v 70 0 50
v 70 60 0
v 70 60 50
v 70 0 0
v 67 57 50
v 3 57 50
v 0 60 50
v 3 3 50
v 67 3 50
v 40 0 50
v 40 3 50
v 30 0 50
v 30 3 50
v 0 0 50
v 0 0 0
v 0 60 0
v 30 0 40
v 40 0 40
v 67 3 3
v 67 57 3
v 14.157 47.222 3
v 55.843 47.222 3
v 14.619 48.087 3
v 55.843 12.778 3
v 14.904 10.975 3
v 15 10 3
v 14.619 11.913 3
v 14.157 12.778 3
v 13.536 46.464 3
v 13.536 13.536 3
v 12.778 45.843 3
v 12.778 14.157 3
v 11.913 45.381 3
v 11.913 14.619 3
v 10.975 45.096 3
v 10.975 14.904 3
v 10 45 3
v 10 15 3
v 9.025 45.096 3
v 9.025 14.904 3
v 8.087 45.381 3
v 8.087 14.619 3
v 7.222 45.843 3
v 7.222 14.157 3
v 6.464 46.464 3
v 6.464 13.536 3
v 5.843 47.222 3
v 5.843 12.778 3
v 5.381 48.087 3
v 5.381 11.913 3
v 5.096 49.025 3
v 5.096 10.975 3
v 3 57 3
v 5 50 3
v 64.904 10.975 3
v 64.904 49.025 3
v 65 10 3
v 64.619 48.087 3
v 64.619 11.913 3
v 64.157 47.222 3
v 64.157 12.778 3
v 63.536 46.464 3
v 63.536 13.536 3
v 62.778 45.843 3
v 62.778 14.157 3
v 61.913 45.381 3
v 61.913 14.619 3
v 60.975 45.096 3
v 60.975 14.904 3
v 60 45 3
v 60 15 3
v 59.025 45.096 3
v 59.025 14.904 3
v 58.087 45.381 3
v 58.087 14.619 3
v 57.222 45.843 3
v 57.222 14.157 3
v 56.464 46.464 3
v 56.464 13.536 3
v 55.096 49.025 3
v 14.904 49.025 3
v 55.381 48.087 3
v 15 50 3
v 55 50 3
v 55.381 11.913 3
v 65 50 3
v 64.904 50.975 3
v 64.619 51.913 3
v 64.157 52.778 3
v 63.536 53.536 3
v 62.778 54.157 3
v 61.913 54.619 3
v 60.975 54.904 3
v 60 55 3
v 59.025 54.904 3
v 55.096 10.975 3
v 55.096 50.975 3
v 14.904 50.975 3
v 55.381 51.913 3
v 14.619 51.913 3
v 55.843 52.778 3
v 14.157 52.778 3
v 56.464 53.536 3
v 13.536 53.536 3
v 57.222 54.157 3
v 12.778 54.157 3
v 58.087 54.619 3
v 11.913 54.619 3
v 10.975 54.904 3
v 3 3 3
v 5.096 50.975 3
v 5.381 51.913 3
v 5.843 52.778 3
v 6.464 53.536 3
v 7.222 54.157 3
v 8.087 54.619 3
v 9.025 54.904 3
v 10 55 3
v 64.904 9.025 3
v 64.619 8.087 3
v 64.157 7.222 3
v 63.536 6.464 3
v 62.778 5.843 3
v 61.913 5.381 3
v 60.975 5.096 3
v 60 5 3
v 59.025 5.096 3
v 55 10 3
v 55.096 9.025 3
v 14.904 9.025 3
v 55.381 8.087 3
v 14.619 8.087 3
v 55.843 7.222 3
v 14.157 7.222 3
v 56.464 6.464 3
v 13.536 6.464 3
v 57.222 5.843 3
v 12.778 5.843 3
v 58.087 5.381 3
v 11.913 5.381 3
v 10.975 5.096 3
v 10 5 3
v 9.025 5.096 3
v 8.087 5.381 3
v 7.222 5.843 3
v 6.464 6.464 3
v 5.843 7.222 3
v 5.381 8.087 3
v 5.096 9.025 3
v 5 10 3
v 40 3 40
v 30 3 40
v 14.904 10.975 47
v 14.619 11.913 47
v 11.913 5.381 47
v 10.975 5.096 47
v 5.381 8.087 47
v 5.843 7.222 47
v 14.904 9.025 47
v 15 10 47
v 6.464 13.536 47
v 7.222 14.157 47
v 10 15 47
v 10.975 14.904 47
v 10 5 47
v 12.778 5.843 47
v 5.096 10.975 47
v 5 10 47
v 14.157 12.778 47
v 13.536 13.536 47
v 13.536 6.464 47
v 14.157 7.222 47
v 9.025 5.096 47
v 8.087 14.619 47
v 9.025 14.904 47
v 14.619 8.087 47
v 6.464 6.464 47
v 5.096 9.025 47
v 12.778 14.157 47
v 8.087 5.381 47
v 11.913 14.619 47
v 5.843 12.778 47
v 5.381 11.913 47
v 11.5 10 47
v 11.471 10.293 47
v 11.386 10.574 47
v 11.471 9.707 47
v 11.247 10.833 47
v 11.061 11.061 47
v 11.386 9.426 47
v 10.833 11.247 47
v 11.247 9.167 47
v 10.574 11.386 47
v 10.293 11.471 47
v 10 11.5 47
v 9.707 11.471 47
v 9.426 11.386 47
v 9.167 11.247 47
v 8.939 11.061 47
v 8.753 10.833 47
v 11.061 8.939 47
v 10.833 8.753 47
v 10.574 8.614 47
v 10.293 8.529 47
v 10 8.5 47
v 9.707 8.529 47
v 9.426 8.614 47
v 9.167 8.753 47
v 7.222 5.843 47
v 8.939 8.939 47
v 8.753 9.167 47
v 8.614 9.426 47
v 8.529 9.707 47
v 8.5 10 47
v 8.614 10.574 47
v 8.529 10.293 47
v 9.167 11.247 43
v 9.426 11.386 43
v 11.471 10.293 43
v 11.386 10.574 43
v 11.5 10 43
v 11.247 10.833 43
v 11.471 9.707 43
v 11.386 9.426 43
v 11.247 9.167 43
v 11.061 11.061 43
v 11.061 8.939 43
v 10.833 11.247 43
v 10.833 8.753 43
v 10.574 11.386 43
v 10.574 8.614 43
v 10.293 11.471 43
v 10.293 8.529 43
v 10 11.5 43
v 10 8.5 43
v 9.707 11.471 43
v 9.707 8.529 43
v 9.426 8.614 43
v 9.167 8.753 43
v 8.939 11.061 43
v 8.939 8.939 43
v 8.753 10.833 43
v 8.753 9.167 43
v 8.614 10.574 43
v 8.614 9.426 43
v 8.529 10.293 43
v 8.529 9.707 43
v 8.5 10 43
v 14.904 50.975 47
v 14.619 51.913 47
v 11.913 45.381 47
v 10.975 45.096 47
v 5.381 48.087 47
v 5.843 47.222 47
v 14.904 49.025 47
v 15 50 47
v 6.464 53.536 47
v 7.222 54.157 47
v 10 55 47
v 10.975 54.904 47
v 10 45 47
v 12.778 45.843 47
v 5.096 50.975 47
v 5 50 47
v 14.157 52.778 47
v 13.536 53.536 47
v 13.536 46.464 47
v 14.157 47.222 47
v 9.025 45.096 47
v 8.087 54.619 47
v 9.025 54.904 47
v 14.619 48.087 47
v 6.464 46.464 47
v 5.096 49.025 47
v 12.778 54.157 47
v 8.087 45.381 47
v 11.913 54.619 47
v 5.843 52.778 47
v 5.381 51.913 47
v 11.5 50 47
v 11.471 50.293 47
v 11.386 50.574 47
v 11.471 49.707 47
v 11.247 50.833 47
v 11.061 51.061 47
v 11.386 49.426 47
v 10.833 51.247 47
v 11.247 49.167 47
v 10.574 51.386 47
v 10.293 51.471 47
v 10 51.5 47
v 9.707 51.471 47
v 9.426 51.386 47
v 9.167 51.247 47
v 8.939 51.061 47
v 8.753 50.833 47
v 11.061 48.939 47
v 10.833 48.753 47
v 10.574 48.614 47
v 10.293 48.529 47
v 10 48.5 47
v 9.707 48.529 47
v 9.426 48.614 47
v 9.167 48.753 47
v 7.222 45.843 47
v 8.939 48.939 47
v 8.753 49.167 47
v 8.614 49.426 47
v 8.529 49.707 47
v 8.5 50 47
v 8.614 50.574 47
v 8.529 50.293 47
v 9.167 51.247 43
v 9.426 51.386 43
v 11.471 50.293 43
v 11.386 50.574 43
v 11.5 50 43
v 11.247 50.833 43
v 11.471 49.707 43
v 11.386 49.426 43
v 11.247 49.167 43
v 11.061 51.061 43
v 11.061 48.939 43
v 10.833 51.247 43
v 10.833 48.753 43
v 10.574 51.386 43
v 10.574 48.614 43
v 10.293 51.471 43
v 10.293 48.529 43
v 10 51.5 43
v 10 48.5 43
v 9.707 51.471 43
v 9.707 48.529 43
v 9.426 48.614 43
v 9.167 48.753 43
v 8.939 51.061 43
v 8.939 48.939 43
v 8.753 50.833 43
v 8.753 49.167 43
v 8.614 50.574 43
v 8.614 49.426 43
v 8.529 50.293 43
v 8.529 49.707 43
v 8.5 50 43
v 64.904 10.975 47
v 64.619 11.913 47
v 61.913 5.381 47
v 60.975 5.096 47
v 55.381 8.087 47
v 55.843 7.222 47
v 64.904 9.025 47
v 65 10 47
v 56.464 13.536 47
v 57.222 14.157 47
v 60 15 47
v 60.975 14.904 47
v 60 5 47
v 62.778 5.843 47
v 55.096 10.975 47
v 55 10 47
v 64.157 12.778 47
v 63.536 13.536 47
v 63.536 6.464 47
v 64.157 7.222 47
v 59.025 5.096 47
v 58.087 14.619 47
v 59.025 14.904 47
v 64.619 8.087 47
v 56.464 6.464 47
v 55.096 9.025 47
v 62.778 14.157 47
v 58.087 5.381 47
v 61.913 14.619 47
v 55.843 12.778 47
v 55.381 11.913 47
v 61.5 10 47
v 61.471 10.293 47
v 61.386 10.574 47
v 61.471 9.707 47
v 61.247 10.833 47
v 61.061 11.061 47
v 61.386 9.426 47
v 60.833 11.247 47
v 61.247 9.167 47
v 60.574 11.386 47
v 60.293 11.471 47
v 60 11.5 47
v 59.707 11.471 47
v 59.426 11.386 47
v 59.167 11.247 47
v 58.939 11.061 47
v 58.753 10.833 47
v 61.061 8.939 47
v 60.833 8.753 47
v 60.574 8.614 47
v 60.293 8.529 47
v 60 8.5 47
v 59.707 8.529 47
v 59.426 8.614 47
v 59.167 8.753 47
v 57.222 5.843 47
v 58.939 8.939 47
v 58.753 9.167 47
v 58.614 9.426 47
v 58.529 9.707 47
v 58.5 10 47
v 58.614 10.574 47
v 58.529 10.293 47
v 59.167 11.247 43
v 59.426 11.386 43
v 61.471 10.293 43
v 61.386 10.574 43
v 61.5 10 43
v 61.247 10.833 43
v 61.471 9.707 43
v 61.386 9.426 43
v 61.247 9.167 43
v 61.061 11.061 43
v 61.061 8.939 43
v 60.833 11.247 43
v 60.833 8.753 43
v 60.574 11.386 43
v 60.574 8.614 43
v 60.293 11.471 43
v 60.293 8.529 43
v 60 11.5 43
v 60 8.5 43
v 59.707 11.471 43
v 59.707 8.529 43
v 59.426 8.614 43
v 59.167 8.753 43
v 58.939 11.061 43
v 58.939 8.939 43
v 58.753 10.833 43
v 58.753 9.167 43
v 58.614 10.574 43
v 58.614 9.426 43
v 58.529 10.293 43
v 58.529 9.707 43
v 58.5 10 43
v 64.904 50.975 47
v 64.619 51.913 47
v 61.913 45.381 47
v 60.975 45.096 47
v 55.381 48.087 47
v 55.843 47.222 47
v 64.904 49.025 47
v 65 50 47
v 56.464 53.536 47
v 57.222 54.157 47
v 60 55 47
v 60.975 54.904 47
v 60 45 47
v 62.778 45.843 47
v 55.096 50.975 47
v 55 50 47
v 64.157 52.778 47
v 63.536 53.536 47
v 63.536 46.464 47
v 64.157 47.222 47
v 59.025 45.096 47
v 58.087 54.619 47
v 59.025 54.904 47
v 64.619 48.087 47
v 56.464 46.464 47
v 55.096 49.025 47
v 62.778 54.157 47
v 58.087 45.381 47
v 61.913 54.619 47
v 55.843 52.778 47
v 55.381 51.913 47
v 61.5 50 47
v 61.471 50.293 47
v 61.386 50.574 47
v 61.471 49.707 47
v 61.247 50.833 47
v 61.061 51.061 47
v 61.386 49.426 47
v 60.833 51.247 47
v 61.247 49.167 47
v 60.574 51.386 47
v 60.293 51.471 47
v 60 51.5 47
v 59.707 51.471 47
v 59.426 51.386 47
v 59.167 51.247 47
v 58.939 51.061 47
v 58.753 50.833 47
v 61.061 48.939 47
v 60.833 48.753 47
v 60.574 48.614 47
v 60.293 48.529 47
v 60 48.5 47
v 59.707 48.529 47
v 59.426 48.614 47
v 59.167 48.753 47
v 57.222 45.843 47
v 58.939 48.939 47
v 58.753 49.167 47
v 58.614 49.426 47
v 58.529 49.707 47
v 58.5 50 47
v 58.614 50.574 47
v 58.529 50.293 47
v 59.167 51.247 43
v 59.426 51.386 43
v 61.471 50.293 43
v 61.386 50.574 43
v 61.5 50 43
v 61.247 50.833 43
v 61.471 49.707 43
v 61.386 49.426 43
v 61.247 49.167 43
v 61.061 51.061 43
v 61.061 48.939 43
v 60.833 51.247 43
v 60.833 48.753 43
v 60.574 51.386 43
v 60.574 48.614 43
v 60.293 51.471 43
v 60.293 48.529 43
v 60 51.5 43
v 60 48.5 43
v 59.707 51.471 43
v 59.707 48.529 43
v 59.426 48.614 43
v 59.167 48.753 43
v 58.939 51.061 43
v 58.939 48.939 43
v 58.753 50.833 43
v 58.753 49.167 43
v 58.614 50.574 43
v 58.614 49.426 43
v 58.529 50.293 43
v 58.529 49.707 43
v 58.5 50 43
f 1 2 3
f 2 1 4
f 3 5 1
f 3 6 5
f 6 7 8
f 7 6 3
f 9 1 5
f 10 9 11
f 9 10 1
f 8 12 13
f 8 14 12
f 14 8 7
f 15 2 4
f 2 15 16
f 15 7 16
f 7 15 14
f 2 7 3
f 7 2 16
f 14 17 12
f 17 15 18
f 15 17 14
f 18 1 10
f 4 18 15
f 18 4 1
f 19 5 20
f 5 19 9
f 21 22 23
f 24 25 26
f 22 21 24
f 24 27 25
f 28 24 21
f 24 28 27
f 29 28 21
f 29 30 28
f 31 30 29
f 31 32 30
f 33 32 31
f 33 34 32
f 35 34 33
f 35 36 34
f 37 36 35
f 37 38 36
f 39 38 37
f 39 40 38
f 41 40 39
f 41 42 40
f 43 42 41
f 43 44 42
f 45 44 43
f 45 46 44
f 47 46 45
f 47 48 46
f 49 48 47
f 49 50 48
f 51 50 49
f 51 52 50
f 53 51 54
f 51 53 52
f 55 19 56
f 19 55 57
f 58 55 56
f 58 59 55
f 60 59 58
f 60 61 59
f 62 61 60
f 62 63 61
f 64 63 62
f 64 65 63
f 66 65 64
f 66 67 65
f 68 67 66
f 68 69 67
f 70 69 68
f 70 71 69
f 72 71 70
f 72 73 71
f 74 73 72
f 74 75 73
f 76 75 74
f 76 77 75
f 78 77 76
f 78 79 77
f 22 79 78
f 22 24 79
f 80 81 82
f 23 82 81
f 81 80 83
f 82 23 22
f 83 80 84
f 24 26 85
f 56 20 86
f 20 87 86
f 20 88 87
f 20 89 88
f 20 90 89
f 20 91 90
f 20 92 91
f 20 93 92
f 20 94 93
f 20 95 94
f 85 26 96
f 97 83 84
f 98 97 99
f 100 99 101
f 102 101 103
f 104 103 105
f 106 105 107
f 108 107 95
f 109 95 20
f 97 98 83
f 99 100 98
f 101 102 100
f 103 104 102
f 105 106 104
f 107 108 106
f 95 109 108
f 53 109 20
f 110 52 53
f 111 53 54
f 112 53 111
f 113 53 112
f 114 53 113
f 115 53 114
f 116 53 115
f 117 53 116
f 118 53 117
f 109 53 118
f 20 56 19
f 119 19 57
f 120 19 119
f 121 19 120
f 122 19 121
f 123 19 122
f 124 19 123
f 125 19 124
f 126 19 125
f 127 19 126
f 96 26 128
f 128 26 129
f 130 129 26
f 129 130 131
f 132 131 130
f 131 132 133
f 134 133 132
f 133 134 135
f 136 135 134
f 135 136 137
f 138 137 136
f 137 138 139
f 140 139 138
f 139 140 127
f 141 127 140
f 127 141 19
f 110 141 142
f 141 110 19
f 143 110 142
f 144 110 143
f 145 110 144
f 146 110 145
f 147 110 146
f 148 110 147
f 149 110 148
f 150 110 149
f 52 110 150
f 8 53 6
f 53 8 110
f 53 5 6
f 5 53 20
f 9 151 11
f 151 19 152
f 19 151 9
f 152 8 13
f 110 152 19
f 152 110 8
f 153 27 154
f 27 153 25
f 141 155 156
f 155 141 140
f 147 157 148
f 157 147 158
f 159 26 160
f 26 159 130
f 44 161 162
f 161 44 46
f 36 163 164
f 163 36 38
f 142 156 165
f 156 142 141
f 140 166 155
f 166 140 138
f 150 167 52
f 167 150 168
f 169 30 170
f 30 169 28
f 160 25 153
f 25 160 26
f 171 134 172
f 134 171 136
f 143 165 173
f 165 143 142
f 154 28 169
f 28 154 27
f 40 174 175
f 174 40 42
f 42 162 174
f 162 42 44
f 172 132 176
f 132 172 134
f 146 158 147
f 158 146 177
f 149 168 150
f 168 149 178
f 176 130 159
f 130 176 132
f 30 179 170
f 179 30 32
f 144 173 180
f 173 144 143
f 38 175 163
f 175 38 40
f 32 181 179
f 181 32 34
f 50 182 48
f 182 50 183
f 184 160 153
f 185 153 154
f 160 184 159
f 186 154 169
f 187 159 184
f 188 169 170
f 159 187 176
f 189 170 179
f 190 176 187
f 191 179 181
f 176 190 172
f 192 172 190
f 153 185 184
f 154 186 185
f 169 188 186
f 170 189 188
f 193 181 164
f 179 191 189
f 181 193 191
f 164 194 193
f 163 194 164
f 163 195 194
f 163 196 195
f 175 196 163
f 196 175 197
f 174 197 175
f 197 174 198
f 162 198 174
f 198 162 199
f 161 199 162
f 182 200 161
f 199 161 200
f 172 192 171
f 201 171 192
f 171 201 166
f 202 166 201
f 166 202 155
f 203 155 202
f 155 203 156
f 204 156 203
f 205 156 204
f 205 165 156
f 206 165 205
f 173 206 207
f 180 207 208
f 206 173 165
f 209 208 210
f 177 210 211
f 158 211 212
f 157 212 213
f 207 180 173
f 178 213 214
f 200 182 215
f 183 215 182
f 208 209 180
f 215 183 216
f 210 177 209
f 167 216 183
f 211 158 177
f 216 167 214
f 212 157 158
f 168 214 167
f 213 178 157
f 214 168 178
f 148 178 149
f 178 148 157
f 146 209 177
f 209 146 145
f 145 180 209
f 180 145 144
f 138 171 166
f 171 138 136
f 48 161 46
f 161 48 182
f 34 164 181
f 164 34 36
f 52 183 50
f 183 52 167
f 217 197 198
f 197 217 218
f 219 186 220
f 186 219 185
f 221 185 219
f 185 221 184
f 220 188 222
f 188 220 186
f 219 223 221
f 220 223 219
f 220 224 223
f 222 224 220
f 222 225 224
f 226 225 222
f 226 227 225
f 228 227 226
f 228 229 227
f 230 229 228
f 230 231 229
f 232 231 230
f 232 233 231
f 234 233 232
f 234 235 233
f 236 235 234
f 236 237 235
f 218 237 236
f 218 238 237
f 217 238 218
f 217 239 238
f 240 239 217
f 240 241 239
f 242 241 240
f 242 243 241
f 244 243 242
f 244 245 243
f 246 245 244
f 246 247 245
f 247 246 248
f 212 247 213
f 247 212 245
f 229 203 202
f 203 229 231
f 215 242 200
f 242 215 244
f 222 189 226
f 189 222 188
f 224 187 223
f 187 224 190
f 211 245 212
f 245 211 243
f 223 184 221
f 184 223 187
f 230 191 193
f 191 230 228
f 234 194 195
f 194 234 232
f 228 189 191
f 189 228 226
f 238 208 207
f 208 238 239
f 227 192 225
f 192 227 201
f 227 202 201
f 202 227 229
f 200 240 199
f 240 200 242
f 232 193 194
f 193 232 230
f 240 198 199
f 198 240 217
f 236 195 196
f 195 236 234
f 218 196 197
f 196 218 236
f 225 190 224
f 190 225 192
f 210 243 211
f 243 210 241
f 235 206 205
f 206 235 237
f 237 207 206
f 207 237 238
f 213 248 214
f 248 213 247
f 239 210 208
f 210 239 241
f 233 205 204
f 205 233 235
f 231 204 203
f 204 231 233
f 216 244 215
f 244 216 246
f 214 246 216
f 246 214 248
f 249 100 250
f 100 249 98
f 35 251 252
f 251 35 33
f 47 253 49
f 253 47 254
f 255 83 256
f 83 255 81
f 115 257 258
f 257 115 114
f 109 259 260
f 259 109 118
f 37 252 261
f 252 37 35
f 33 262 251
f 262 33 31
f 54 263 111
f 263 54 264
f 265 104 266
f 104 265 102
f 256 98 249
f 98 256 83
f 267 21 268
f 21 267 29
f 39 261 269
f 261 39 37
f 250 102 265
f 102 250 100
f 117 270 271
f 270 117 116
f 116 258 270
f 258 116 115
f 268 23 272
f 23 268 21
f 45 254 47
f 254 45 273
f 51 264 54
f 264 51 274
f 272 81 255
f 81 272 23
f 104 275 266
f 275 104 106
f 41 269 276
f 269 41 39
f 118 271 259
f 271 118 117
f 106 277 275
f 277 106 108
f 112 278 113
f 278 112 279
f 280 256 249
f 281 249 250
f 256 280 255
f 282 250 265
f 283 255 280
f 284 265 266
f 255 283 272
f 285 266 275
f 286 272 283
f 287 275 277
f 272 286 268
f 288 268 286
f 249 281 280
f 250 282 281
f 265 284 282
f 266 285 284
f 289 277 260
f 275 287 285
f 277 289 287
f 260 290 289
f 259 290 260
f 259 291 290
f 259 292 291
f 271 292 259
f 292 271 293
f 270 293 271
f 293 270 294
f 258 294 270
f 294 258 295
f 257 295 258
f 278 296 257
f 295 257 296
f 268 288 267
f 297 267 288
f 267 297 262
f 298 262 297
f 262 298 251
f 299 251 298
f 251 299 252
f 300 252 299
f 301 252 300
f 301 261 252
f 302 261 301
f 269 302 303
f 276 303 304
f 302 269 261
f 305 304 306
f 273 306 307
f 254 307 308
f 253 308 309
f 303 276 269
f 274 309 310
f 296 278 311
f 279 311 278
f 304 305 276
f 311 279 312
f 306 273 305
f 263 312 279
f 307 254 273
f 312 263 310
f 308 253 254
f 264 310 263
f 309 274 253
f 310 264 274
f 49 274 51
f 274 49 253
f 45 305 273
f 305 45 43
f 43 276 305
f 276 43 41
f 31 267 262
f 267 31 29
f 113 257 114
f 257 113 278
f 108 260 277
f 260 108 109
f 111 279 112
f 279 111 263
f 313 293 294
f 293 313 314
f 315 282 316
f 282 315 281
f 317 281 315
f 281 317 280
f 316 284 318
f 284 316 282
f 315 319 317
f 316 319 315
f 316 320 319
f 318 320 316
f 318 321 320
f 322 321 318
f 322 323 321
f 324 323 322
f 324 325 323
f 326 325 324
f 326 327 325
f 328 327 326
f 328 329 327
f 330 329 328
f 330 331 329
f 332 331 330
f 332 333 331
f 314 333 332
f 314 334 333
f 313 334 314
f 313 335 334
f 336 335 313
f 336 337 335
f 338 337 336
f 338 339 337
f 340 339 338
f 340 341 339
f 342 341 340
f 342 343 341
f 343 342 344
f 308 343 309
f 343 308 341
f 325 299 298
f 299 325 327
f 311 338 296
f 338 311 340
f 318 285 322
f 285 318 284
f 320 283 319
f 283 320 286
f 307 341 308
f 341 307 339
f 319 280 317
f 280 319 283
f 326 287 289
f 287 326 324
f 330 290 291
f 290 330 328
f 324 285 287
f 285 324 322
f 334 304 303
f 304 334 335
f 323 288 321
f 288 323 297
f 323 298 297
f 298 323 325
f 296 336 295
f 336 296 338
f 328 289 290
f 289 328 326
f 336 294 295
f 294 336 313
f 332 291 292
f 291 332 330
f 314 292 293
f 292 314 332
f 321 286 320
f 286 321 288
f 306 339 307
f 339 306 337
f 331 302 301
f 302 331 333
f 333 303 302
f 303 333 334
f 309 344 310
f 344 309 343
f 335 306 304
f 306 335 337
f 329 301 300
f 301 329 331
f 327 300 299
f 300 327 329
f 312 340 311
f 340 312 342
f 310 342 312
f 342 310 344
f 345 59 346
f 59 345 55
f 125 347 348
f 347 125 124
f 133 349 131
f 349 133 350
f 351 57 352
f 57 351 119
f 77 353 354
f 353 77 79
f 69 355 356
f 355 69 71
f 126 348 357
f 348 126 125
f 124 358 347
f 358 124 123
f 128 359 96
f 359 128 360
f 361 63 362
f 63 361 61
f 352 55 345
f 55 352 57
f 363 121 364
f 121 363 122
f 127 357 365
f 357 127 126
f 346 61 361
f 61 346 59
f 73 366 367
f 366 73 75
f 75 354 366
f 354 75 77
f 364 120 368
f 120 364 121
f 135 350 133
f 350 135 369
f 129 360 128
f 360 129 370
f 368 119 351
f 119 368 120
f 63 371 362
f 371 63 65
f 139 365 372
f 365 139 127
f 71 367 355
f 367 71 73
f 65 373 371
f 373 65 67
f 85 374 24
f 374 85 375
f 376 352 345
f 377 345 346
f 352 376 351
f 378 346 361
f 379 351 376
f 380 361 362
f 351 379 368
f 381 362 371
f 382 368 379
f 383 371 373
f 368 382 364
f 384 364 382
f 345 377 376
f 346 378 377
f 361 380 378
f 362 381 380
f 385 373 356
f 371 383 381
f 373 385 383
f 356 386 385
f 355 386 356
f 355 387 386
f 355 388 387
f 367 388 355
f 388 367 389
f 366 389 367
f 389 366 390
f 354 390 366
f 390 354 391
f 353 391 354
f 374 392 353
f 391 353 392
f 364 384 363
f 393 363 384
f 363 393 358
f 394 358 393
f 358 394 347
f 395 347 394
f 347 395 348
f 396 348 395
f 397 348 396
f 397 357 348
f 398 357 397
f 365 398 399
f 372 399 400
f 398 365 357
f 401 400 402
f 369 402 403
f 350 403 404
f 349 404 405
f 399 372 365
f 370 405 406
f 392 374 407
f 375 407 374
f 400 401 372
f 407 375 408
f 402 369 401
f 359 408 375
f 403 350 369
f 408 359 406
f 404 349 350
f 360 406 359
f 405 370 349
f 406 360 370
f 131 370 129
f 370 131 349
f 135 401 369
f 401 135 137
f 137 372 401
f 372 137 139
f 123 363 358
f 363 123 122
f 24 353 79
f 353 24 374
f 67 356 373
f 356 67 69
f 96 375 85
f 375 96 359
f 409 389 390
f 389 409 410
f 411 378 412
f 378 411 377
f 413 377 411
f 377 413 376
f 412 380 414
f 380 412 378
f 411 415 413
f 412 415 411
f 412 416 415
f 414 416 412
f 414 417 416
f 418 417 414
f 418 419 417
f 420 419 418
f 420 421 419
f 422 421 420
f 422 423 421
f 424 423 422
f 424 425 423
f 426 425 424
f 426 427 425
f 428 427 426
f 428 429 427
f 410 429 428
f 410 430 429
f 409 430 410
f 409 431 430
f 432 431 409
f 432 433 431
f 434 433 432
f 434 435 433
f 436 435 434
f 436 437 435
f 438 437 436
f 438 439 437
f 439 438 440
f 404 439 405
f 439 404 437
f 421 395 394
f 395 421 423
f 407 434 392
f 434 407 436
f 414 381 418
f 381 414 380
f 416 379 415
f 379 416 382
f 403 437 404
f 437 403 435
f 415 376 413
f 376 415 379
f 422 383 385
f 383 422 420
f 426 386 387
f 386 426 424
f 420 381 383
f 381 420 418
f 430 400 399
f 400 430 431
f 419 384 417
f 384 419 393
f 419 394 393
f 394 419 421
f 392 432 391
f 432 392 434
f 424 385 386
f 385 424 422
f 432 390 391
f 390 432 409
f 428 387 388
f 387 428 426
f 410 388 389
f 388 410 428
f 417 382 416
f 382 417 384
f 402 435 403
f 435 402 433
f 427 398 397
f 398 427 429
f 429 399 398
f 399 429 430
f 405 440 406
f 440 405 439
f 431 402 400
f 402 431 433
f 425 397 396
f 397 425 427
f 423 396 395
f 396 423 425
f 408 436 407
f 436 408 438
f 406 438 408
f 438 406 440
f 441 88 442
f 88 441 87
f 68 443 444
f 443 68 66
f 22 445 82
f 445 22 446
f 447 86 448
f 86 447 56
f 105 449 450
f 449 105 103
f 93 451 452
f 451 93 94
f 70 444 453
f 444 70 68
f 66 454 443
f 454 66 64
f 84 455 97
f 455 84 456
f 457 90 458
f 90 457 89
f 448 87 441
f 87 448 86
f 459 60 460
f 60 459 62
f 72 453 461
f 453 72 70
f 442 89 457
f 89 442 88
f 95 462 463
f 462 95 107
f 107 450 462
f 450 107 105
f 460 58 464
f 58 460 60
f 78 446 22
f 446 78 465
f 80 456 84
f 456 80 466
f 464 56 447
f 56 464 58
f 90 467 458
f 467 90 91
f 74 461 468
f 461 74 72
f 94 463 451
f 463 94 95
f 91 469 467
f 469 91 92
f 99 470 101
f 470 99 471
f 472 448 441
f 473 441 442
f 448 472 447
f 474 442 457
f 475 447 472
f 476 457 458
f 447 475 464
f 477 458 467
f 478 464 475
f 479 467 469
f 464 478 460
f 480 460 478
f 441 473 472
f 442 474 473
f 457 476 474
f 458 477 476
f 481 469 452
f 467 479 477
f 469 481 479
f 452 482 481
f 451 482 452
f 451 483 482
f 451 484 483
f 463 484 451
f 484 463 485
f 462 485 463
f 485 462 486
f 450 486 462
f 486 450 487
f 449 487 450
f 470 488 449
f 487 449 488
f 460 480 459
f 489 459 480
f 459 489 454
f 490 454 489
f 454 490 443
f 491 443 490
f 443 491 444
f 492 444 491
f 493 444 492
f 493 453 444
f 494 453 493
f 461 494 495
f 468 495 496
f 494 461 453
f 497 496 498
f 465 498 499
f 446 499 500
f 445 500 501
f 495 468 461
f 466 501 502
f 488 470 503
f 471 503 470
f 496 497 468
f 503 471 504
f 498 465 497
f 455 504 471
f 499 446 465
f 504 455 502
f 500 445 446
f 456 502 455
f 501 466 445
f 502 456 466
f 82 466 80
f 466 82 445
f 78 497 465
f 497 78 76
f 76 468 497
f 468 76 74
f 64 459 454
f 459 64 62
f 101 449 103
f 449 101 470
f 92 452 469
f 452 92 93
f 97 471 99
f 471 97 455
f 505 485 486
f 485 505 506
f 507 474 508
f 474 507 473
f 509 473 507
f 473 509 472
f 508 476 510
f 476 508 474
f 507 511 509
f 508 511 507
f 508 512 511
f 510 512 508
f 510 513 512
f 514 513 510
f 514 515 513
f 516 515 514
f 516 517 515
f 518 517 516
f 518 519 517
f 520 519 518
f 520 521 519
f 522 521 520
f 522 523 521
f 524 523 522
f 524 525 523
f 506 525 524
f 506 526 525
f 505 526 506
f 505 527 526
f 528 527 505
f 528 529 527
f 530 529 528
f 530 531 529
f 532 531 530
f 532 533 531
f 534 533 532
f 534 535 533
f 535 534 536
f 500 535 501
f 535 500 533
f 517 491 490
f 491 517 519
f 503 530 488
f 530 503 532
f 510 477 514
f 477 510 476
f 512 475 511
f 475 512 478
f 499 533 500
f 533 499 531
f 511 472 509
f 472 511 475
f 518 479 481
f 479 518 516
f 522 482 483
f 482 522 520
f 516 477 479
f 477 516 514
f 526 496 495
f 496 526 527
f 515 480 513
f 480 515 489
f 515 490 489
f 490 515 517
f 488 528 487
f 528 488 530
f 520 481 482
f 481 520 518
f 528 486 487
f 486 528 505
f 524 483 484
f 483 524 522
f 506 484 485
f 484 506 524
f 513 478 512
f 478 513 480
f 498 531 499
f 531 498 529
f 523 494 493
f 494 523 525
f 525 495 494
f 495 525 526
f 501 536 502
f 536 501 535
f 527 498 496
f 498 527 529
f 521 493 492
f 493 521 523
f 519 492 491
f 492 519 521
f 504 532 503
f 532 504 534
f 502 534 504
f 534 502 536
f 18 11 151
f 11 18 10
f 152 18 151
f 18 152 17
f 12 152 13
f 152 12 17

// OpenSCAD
$fn = 32;

// ----------------------------------------------------------------------
// Enclosure box: both enclosure
// ----------------------------------------------------------------------

// --- parameters (mm) ---
box_l = 70;               // outer length, X
box_w = 60;               // outer width, Y
box_h = 50;               // outer height
wall_t = 3;               // wall thickness
boss_r = 5;               // corner boss radius
hole_r = 1.5;             // boss screw hole radius
boss_in = 10;             // boss inset from the corners
notch_w = 10;             // cable notch width
notch_h = 10;             // cable notch height

inner_h = box_h - wall_t;  // cavity depth
boss_h = inner_h - 2;  // corner boss height

difference() {
  union() {
    difference() {
      cube([box_l, box_w, box_h]);
      translate([wall_t, wall_t, wall_t])
        cube([box_l - 2 * wall_t, box_w - 2 * wall_t, box_h]);
    }
    for (sx = [0, 1], sy = [0, 1])
      translate([sx ? box_l - boss_in : boss_in,
                 sy ? box_w - boss_in : boss_in, wall_t - 1])
        difference() {
          cylinder(r = boss_r, h = boss_h);
          translate([0, 0, boss_h - 4])
            cylinder(r = hole_r, h = 5);
        }
  }
  translate([box_l / 2 - notch_w / 2, -1, box_h - notch_h])
    cube([notch_w, wall_t + 2, notch_h + 1]);
}
